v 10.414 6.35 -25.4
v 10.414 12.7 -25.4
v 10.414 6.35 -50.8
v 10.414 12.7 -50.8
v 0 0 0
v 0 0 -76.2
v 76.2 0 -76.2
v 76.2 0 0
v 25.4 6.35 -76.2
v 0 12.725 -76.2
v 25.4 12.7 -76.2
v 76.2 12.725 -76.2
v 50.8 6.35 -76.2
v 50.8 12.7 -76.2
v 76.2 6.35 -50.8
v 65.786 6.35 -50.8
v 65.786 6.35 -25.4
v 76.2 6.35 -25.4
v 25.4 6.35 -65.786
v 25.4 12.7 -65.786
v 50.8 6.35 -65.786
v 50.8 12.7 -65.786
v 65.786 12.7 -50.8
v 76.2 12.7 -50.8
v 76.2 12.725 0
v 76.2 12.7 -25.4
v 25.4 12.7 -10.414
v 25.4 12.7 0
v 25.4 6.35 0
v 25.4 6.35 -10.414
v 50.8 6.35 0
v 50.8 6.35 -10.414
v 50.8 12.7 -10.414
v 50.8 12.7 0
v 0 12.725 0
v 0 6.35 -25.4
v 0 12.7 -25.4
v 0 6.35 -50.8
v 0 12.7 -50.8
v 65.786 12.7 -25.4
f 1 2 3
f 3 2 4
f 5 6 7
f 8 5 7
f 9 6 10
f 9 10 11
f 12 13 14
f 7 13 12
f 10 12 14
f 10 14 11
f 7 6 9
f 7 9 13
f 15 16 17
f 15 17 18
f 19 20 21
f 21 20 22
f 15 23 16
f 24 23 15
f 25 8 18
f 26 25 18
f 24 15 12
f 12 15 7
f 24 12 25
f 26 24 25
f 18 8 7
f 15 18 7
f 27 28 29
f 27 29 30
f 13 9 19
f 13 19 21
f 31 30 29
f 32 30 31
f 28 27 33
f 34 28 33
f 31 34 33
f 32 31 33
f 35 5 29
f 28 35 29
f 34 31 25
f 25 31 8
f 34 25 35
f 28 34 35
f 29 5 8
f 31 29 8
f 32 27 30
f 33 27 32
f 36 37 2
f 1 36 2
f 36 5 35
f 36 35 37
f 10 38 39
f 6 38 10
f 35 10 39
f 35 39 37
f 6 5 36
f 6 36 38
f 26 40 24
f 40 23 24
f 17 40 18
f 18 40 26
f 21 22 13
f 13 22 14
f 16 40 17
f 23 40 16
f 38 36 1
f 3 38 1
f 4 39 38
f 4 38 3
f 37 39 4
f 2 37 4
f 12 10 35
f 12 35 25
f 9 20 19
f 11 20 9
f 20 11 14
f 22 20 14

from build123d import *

# Parameters (mm, degrees)
SKETCH1_W           = 76.2
SKETCH1_H           = 76.2
BOSS_EXTRUDE1_DEPTH = 12.7
SKETCH2_W           = 25.4
SKETCH2_H           = 10.414
SKETCH2_W_2         = 10.414
SKETCH2_H_2         = 25.4
CUT_EXTRUDE1_DEPTH  = 6.35
SKETCH3_W           = 76.2
SKETCH3_H           = 76.2
BOSS_EXTRUDE2_DEPTH = 0.0254


with BuildPart() as part:
    # Sketch1 → Boss-Extrude1 (new body)
    with BuildSketch(Plane(origin=(0, 0, 0), x_dir=(1, 0, 0), z_dir=(0, 1, 0))):
        with Locations((38.1, 38.1)):
            Rectangle(SKETCH1_W, SKETCH1_H)
    extrude(amount=BOSS_EXTRUDE1_DEPTH)

    # Sketch2 → Cut-Extrude1 (cut)
    with BuildSketch(Plane(origin=(0, 12.7, 0), x_dir=(1, 0, 0), z_dir=(0, 1, 0))):
        with Locations((38.1, 70.993)):
            Rectangle(SKETCH2_W, SKETCH2_H)
        with Locations((5.207, 38.1)):
            Rectangle(SKETCH2_W_2, SKETCH2_H_2)
        with Locations((38.1, 5.207)):
            Rectangle(SKETCH2_W, SKETCH2_H)
        with Locations((70.993, 38.1)):
            Rectangle(SKETCH2_W_2, SKETCH2_H_2)
    extrude(amount=-CUT_EXTRUDE1_DEPTH, mode=Mode.SUBTRACT)

    # Sketch3 → Boss-Extrude2 (add)
    with BuildSketch(Plane(origin=(0, 12.7, 0), x_dir=(1, 0, 0), z_dir=(0, 1, 0))):
        with Locations((38.1, 38.1)):
            Rectangle(SKETCH3_W, SKETCH3_H)
    extrude(amount=BOSS_EXTRUDE2_DEPTH)


solid = part.part
